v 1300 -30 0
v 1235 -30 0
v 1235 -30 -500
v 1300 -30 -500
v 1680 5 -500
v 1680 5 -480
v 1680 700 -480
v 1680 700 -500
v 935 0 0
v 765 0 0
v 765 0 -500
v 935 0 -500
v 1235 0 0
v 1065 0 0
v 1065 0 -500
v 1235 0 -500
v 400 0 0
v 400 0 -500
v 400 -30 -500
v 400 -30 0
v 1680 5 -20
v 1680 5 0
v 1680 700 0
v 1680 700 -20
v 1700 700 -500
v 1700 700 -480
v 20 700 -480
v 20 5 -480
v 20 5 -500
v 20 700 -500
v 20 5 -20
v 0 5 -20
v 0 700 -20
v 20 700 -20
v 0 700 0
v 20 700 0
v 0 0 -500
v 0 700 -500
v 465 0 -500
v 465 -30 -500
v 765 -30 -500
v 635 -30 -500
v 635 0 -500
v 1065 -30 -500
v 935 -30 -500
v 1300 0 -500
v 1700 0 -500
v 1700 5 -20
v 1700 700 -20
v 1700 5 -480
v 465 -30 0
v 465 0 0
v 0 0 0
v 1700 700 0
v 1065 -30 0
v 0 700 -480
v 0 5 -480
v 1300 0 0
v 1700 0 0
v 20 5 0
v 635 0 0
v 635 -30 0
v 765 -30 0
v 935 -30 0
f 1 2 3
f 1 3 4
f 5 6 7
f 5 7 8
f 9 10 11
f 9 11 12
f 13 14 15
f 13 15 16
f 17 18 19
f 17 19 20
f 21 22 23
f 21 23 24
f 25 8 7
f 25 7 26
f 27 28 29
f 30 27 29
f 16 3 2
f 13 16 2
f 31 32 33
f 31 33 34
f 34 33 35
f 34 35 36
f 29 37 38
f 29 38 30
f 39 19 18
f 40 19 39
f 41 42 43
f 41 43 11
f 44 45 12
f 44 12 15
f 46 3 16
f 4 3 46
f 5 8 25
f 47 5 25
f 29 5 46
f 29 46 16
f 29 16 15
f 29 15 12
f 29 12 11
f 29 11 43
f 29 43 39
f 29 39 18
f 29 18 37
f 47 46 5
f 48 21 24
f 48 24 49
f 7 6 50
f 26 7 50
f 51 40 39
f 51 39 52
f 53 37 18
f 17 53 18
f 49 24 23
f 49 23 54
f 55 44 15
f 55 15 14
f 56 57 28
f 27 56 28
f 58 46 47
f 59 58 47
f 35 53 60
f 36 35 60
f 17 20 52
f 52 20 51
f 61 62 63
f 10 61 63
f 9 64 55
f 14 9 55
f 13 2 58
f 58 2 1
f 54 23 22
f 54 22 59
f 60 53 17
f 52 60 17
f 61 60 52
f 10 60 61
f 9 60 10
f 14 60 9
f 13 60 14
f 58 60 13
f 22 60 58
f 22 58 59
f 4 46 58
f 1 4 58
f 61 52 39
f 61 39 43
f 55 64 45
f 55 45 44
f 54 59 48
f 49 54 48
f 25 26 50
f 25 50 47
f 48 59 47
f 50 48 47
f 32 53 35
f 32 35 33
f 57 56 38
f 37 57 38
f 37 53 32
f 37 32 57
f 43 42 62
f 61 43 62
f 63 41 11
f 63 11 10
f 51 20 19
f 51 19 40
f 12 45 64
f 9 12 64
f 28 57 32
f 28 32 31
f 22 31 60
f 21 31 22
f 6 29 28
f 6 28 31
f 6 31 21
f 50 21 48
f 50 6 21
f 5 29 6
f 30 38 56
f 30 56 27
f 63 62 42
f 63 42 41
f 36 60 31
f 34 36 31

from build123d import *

# Parameters (mm, degrees)
SKETCH1_W           = 1700
SKETCH1_H           = 500
BOSS_EXTRUDE1_DEPTH = 5
SKETCH2_W           = 20
SKETCH2_H           = 20
BOSS_EXTRUDE2_DEPTH = 695
SKETCH3_W           = 900
SKETCH3_H           = 500
BOSS_EXTRUDE3_DEPTH = 30
SKETCH4_W           = 170
SKETCH4_H           = 500
CUT_EXTRUDE1_DEPTH  = 30


with BuildPart() as part:
    # Sketch1 → Boss-Extrude1 (new body)
    with BuildSketch(Plane(origin=(0, 0, 0), x_dir=(1, 0, 0), z_dir=(0, 1, 0))):
        with Locations((850, 250)):
            Rectangle(SKETCH1_W, SKETCH1_H)
    extrude(amount=BOSS_EXTRUDE1_DEPTH)

    # Sketch2 → Boss-Extrude2 (add)
    with BuildSketch(Plane(origin=(0, 5, 0), x_dir=(1, 0, 0), z_dir=(0, 1, 0))):
        with Locations((10, 490)):
            Rectangle(SKETCH2_W, SKETCH2_H)
        with Locations((10, 10)):
            Rectangle(SKETCH2_W, SKETCH2_H)
        with Locations((1690, 10)):
            Rectangle(SKETCH2_W, SKETCH2_H)
        with Locations((1690, 490)):
            Rectangle(SKETCH2_W, SKETCH2_H)
    extrude(amount=BOSS_EXTRUDE2_DEPTH)

    # Sketch3 → Boss-Extrude3 (add)
    with BuildSketch(Plane.XZ):
        with Locations((850, -250)):
            Rectangle(SKETCH3_W, SKETCH3_H)
    extrude(amount=BOSS_EXTRUDE3_DEPTH)

    # Sketch4 → Cut-Extrude1 (cut)
    with BuildSketch(Plane.XZ.offset(30)):
        with Locations((550, -250)):
            Rectangle(SKETCH4_W, SKETCH4_H)
        with Locations((850, -250)):
            Rectangle(SKETCH4_W, SKETCH4_H)
        with Locations((1150, -250)):
            Rectangle(SKETCH4_W, SKETCH4_H)
    extrude(amount=-CUT_EXTRUDE1_DEPTH, mode=Mode.SUBTRACT)


solid = part.part
